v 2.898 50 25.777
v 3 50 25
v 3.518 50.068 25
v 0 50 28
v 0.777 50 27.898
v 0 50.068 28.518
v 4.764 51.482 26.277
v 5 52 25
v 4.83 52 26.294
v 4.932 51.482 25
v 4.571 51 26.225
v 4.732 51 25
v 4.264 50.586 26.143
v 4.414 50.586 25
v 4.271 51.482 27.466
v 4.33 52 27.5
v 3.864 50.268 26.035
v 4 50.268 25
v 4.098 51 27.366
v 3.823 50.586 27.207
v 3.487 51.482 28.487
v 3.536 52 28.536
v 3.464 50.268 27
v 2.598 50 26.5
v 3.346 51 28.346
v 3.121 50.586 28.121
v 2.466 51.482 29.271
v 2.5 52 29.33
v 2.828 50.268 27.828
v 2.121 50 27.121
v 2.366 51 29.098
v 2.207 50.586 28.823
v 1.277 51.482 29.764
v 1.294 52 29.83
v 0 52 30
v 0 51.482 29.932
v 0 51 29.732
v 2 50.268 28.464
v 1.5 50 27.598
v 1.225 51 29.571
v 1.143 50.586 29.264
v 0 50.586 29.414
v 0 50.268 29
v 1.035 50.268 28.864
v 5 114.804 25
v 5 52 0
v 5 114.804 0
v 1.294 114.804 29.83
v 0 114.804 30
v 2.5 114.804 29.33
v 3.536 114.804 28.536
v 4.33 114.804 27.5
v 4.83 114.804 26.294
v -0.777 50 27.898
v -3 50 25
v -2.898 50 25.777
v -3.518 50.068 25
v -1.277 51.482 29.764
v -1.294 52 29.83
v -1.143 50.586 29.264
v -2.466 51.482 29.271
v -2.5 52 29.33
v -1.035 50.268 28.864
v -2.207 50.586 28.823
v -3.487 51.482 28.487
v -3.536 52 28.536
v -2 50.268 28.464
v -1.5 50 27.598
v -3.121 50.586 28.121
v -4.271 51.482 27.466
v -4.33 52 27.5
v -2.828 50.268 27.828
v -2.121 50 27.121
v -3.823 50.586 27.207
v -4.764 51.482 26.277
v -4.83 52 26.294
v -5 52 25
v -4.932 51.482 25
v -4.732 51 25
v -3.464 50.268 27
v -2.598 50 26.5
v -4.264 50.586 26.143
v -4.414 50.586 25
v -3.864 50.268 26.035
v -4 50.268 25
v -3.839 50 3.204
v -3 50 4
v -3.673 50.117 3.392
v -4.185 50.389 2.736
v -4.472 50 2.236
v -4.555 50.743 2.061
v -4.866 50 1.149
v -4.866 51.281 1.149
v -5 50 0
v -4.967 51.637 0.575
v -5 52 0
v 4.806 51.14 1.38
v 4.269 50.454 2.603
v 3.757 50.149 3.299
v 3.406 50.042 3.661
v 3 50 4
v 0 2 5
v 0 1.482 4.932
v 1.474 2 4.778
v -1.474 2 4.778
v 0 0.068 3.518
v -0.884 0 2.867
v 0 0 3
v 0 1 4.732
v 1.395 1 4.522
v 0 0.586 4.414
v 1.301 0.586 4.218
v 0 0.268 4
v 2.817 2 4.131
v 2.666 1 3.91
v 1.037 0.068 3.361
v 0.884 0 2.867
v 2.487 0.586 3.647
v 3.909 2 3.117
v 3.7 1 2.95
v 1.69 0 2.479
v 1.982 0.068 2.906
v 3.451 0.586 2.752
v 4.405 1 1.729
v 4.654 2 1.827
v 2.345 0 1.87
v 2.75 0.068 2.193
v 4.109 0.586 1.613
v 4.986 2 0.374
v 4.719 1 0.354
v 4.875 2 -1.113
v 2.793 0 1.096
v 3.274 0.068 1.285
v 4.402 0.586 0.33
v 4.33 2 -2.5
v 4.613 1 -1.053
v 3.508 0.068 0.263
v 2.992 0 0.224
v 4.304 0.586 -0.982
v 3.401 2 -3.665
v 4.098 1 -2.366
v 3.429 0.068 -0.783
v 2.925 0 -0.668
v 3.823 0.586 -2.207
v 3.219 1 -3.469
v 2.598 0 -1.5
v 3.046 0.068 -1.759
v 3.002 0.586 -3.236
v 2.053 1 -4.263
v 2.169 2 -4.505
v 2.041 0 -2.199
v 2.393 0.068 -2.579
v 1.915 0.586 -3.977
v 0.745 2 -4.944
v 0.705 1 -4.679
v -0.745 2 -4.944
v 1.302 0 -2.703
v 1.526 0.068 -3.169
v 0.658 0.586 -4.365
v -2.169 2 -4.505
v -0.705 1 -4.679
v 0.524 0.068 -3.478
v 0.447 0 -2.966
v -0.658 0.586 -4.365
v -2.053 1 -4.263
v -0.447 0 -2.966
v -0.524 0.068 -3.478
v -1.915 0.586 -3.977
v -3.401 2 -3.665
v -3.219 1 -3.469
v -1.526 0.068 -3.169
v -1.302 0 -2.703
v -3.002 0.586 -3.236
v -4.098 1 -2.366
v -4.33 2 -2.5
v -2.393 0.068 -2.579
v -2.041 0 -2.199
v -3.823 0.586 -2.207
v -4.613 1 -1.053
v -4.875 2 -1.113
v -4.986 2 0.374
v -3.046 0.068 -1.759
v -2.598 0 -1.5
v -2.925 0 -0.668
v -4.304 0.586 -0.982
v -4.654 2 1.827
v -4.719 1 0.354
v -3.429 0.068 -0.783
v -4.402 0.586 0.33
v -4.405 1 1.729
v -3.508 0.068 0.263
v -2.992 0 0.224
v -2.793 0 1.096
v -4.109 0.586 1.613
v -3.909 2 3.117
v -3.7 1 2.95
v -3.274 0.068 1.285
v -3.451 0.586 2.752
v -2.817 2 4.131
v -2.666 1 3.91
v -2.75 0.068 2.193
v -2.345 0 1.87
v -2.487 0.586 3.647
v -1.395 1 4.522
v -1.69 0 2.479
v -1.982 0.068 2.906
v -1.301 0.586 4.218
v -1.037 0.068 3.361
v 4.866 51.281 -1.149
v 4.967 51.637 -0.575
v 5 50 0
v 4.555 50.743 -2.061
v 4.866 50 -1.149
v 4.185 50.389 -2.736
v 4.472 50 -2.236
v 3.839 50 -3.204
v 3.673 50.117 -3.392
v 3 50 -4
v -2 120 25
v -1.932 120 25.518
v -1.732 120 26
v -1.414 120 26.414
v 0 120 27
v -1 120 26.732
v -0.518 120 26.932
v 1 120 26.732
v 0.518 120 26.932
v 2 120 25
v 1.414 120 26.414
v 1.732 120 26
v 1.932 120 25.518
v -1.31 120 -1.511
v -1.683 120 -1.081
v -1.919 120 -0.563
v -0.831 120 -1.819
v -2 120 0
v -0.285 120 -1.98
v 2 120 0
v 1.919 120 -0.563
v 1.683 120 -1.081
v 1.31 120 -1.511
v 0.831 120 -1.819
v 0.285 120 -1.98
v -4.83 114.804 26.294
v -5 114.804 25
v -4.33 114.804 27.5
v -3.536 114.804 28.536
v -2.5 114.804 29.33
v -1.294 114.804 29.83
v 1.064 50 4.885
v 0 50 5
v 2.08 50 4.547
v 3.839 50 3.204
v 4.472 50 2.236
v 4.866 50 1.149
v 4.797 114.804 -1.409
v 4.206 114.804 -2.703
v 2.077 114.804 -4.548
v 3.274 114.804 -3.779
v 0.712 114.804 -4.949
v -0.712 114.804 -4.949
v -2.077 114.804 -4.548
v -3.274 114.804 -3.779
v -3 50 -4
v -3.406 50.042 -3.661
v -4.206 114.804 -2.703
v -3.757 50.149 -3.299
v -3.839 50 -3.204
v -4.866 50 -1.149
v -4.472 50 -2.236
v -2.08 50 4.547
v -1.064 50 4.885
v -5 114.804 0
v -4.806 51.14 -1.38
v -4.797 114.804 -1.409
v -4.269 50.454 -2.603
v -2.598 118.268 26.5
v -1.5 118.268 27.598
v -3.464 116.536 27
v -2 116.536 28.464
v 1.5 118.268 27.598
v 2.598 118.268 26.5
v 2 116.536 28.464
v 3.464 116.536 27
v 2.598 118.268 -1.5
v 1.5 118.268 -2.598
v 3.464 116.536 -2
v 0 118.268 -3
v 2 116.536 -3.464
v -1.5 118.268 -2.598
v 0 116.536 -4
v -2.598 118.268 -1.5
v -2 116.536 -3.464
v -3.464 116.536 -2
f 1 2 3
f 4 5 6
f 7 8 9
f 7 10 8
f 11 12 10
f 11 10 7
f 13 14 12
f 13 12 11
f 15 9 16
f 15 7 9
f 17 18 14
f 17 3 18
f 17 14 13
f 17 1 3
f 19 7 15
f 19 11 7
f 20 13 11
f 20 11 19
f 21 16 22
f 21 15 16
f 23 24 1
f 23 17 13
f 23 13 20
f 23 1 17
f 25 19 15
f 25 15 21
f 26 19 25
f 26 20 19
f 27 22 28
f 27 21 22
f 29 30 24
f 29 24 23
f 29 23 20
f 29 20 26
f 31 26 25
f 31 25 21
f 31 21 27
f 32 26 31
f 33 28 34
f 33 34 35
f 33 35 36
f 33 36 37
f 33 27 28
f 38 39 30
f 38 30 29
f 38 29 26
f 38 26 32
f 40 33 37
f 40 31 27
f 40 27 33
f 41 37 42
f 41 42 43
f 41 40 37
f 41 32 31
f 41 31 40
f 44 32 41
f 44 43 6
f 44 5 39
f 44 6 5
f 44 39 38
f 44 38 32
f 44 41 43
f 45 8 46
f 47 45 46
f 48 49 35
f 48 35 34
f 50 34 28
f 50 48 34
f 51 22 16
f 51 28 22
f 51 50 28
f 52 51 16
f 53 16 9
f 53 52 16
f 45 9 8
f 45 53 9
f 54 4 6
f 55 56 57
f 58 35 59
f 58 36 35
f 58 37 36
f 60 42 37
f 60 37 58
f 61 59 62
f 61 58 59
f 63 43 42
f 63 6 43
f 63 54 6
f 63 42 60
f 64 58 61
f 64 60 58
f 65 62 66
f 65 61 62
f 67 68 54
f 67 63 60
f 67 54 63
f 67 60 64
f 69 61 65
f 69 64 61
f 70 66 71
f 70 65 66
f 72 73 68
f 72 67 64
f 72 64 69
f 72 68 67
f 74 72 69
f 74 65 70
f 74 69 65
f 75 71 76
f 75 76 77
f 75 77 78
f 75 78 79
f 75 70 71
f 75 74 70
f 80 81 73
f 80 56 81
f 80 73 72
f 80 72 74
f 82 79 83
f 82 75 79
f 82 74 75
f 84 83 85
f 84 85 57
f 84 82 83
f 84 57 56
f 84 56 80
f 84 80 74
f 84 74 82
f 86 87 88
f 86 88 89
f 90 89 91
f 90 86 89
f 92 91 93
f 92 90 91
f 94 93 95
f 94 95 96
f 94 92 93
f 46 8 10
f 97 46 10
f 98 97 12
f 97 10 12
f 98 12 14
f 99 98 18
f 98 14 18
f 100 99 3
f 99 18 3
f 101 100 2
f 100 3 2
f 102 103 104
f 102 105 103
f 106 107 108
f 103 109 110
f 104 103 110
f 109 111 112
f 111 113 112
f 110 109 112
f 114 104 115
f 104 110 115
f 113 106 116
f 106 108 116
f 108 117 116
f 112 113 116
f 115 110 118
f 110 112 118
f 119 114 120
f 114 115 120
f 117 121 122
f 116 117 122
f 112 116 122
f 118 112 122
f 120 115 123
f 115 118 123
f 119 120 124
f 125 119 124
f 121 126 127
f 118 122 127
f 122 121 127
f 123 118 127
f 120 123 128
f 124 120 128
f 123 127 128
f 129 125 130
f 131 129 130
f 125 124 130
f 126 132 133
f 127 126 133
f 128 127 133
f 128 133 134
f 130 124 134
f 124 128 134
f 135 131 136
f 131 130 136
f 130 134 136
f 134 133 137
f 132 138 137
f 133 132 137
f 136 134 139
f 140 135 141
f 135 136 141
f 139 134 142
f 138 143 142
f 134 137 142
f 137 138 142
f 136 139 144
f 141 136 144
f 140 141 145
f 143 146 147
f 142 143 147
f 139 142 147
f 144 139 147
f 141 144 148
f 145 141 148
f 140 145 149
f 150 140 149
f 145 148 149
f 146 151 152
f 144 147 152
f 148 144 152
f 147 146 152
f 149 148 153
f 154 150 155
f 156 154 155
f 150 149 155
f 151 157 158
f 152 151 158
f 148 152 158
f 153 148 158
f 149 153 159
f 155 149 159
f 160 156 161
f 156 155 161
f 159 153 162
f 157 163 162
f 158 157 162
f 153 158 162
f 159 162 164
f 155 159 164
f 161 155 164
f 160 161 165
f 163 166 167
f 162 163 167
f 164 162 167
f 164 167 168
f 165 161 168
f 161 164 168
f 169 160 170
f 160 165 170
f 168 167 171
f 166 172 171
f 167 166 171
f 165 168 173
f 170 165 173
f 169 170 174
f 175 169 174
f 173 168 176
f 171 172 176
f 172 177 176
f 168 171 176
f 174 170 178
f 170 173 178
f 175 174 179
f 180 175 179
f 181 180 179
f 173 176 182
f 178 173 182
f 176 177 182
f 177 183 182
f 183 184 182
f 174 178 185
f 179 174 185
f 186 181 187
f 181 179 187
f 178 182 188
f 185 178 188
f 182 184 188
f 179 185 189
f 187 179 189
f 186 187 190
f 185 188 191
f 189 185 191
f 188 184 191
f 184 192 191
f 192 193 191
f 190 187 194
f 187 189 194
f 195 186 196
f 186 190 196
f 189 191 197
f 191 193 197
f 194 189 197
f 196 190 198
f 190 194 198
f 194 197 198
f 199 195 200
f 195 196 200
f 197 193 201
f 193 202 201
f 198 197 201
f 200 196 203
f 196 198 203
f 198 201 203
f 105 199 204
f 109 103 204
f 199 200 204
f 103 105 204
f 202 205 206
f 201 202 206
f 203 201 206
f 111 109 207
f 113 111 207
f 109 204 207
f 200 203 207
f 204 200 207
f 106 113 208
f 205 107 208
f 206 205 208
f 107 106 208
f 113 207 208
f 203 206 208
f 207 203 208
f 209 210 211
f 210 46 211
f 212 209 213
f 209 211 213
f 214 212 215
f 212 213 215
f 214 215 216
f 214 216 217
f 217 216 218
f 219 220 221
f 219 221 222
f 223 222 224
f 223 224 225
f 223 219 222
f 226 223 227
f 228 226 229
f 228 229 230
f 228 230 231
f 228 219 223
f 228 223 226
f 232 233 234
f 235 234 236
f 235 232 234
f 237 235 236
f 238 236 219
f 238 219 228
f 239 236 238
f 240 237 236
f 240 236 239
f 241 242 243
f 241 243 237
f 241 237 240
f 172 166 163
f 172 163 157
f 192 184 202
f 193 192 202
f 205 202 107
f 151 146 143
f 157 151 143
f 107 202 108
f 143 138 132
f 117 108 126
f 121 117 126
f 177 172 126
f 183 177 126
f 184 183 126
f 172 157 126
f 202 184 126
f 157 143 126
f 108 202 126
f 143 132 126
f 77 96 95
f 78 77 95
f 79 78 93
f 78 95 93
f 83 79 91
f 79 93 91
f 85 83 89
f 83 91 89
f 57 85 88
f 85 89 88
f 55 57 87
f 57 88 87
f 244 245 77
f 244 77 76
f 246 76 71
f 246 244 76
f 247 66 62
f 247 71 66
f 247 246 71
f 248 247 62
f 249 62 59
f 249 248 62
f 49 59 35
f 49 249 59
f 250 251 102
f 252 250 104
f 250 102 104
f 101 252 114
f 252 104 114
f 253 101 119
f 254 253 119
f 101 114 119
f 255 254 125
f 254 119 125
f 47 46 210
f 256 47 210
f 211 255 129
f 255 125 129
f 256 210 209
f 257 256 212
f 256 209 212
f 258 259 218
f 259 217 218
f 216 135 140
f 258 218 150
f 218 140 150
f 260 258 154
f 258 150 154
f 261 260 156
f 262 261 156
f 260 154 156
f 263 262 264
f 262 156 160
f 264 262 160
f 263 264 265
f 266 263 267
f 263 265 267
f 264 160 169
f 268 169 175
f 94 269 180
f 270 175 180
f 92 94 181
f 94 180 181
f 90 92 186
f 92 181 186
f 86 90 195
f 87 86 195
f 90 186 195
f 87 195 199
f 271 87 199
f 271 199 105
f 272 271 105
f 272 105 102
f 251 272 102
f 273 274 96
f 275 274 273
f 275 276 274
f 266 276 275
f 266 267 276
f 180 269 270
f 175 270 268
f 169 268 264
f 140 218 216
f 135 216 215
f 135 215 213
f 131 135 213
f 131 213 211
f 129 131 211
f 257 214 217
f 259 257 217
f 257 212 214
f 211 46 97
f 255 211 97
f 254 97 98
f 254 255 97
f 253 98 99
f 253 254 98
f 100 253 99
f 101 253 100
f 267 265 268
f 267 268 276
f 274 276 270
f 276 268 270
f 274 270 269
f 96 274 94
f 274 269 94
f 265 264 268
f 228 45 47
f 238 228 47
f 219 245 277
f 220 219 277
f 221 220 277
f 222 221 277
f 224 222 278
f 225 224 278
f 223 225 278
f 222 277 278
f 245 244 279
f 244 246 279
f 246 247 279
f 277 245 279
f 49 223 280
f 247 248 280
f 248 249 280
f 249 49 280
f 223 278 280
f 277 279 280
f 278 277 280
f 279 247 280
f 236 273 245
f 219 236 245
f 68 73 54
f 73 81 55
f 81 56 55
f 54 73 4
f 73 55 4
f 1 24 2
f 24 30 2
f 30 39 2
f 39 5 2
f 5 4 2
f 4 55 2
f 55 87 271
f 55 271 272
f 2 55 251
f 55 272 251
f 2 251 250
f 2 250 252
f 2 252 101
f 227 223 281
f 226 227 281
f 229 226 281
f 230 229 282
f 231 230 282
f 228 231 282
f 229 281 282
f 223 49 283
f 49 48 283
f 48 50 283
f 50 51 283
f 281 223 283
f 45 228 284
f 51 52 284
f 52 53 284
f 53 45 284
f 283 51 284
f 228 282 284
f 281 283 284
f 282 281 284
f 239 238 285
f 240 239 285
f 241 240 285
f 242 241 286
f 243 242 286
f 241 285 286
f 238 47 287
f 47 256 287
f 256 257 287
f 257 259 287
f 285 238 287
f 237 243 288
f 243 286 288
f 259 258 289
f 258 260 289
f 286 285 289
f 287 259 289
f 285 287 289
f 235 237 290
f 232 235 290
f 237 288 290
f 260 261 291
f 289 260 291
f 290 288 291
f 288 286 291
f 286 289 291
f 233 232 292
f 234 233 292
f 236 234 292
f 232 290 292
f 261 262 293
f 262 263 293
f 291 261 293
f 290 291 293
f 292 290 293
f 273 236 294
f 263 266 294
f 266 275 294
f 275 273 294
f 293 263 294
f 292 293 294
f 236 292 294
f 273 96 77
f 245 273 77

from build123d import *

# Parameters (mm, degrees)
SKETCH1_R           = 5
BOSS_EXTRUDE1_DEPTH = 50
BOSS_EXTRUDE2_DEPTH = 70
FILLET1_R           = 5
FILLET2_R           = 2
FILLET3_R           = 2
CHAMFER1_SIZE       = 3
CHAMFER1_SIZE2      = 5.196152423


# Some blends are built 0.0001 mm under size
with BuildPart() as part:
    # Sketch1 → Boss-Extrude1 (new body)
    with BuildSketch(Plane(origin=(0, 0, 0), x_dir=(1, 0, 0), z_dir=(0, 1, 0))):
        with Locations(Location((0, 0, 0), (0, 0, 270))):
            Circle(SKETCH1_R)
    extrude(amount=BOSS_EXTRUDE1_DEPTH)

    # Sketch2 → Boss-Extrude2 (add)
    with BuildSketch(Plane(origin=(0, 50, 0), x_dir=(1, 0, 0), z_dir=(0, 1, 0))):
        with BuildLine():
            Line((-5, 0), (-5, -30))
            Line((-5, -30), (5, -30))
            Line((5, -30), (5, 0))
            ThreePointArc((5, 0), (0, 5), (-5, 0))
        make_face()
    extrude(amount=BOSS_EXTRUDE2_DEPTH)

    # Fillet1
    fillet1_edges = [part.edges().sort_by_distance(p)[0] for p in [
        (-5, 85, 30),
        (5, 85, 30),
    ]]
    fillet(fillet1_edges, radius=FILLET1_R - 0.0001)  # a hair under: the kernel refuses the full size

    # Fillet2
    # the kernel refuses this fillet: 2 mm, written as the material it takes off along each edge
    with BuildSketch(Plane(origin=(5, 50, 25.0001), x_dir=(-1, 0, 0), z_dir=(0, 0, -1))) as fillet2_piece_1_section:
        with BuildLine():
            CenterArc((FILLET2_R, FILLET2_R), FILLET2_R, 180, 90)
            Line((0, FILLET2_R), (0, 0))
            Line((0, 0), (FILLET2_R, 0))
        make_face()
    fillet2_piece_1 = extrude(amount=30.0001, mode=Mode.PRIVATE)
    fillet2_piece_1 = fillet2_piece_1 - Plane(origin=(0, 50.338854102, 0), x_dir=(0, 0, 1), z_dir=(0, -1, 0)) * Cylinder(5, 69, mode=Mode.PRIVATE)
    add(fillet2_piece_1, mode=Mode.SUBTRACT)
    with BuildSketch(Plane(origin=(0.0001, 50, 25.0001), x_dir=(1, 0, 0), z_dir=(0, 0, -1))) as fillet2_piece_2:
        with BuildLine():
            CenterArc((4.9999 - FILLET2_R, -FILLET2_R), FILLET2_R, 0, 90)
            Line((4.9999, -FILLET2_R), (4.9999, 0))
            Line((4.9999, 0), (4.9999 - FILLET2_R, 0))
        make_face()
    revolve(axis=Axis((0.0001, 50, 25.0001), (0, -1, 0)), revolution_arc=90, mode=Mode.SUBTRACT)
    with BuildSketch(Plane(origin=(-0.0001, 50, 25.0001), x_dir=(0, 0, 1), z_dir=(1, 0, 0))) as fillet2_piece_3:
        with BuildLine():
            CenterArc((4.9999 - FILLET2_R, -FILLET2_R), FILLET2_R, 0, 90)
            Line((4.9999, -FILLET2_R), (4.9999, 0))
            Line((4.9999, 0), (4.9999 - FILLET2_R, 0))
        make_face()
    revolve(axis=Axis((-0.0001, 50, 25.0001), (0, -1, 0)), revolution_arc=90, mode=Mode.SUBTRACT)
    with BuildSketch(Plane(origin=(-5, 50, -5), x_dir=(1, 0, 0), z_dir=(0, 0, 1))) as fillet2_piece_4_section:
        with BuildLine():
            CenterArc((FILLET2_R, FILLET2_R), FILLET2_R, 180, 90)
            Line((0, FILLET2_R), (0, 0))
            Line((0, 0), (FILLET2_R, 0))
        make_face()
    fillet2_piece_4 = extrude(amount=30.0001, mode=Mode.PRIVATE)
    fillet2_piece_4 = fillet2_piece_4 - Plane(origin=(0, 50.465433579, 0), x_dir=(0, 0, 1), z_dir=(0, -1, 0)) * Cylinder(5, 69, mode=Mode.PRIVATE)
    add(fillet2_piece_4, mode=Mode.SUBTRACT)
    with BuildSketch(Plane(origin=(-0.0001, 50, 30), x_dir=(0, 0, -1), z_dir=(1, 0, 0))) as fillet2_piece_5:
        with BuildLine():
            CenterArc((FILLET2_R, FILLET2_R), FILLET2_R, 180, 90)
            Line((0, FILLET2_R), (0, 0))
            Line((0, 0), (FILLET2_R, 0))
        make_face()
    extrude(amount=0.0002, mode=Mode.SUBTRACT)

    # Fillet3
    fillet3_edges = [part.edges().sort_by_distance(p)[0] for p in [
        (0, 0, -5),
    ]]
    fillet(fillet3_edges, radius=FILLET3_R)

    # Chamfer1
    chamfer1_edges = [part.edges().sort_by_distance(p)[0] for p in [
        (5, 120, 12.50005),
        (3.535563195, 120, 28.535563195),
        (-3.535563195, 120, 28.535563195),
        (0, 120, -5),
        (-5, 120, 12.50005),
    ]]
    chamfer1_side = [part.faces().sort_by_distance(p)[0] for p in [
        (0, 120, 12.500020673),
    ]]
    chamfer(chamfer1_edges, length=CHAMFER1_SIZE, length2=CHAMFER1_SIZE2, reference=chamfer1_side[0])


solid = part.part
